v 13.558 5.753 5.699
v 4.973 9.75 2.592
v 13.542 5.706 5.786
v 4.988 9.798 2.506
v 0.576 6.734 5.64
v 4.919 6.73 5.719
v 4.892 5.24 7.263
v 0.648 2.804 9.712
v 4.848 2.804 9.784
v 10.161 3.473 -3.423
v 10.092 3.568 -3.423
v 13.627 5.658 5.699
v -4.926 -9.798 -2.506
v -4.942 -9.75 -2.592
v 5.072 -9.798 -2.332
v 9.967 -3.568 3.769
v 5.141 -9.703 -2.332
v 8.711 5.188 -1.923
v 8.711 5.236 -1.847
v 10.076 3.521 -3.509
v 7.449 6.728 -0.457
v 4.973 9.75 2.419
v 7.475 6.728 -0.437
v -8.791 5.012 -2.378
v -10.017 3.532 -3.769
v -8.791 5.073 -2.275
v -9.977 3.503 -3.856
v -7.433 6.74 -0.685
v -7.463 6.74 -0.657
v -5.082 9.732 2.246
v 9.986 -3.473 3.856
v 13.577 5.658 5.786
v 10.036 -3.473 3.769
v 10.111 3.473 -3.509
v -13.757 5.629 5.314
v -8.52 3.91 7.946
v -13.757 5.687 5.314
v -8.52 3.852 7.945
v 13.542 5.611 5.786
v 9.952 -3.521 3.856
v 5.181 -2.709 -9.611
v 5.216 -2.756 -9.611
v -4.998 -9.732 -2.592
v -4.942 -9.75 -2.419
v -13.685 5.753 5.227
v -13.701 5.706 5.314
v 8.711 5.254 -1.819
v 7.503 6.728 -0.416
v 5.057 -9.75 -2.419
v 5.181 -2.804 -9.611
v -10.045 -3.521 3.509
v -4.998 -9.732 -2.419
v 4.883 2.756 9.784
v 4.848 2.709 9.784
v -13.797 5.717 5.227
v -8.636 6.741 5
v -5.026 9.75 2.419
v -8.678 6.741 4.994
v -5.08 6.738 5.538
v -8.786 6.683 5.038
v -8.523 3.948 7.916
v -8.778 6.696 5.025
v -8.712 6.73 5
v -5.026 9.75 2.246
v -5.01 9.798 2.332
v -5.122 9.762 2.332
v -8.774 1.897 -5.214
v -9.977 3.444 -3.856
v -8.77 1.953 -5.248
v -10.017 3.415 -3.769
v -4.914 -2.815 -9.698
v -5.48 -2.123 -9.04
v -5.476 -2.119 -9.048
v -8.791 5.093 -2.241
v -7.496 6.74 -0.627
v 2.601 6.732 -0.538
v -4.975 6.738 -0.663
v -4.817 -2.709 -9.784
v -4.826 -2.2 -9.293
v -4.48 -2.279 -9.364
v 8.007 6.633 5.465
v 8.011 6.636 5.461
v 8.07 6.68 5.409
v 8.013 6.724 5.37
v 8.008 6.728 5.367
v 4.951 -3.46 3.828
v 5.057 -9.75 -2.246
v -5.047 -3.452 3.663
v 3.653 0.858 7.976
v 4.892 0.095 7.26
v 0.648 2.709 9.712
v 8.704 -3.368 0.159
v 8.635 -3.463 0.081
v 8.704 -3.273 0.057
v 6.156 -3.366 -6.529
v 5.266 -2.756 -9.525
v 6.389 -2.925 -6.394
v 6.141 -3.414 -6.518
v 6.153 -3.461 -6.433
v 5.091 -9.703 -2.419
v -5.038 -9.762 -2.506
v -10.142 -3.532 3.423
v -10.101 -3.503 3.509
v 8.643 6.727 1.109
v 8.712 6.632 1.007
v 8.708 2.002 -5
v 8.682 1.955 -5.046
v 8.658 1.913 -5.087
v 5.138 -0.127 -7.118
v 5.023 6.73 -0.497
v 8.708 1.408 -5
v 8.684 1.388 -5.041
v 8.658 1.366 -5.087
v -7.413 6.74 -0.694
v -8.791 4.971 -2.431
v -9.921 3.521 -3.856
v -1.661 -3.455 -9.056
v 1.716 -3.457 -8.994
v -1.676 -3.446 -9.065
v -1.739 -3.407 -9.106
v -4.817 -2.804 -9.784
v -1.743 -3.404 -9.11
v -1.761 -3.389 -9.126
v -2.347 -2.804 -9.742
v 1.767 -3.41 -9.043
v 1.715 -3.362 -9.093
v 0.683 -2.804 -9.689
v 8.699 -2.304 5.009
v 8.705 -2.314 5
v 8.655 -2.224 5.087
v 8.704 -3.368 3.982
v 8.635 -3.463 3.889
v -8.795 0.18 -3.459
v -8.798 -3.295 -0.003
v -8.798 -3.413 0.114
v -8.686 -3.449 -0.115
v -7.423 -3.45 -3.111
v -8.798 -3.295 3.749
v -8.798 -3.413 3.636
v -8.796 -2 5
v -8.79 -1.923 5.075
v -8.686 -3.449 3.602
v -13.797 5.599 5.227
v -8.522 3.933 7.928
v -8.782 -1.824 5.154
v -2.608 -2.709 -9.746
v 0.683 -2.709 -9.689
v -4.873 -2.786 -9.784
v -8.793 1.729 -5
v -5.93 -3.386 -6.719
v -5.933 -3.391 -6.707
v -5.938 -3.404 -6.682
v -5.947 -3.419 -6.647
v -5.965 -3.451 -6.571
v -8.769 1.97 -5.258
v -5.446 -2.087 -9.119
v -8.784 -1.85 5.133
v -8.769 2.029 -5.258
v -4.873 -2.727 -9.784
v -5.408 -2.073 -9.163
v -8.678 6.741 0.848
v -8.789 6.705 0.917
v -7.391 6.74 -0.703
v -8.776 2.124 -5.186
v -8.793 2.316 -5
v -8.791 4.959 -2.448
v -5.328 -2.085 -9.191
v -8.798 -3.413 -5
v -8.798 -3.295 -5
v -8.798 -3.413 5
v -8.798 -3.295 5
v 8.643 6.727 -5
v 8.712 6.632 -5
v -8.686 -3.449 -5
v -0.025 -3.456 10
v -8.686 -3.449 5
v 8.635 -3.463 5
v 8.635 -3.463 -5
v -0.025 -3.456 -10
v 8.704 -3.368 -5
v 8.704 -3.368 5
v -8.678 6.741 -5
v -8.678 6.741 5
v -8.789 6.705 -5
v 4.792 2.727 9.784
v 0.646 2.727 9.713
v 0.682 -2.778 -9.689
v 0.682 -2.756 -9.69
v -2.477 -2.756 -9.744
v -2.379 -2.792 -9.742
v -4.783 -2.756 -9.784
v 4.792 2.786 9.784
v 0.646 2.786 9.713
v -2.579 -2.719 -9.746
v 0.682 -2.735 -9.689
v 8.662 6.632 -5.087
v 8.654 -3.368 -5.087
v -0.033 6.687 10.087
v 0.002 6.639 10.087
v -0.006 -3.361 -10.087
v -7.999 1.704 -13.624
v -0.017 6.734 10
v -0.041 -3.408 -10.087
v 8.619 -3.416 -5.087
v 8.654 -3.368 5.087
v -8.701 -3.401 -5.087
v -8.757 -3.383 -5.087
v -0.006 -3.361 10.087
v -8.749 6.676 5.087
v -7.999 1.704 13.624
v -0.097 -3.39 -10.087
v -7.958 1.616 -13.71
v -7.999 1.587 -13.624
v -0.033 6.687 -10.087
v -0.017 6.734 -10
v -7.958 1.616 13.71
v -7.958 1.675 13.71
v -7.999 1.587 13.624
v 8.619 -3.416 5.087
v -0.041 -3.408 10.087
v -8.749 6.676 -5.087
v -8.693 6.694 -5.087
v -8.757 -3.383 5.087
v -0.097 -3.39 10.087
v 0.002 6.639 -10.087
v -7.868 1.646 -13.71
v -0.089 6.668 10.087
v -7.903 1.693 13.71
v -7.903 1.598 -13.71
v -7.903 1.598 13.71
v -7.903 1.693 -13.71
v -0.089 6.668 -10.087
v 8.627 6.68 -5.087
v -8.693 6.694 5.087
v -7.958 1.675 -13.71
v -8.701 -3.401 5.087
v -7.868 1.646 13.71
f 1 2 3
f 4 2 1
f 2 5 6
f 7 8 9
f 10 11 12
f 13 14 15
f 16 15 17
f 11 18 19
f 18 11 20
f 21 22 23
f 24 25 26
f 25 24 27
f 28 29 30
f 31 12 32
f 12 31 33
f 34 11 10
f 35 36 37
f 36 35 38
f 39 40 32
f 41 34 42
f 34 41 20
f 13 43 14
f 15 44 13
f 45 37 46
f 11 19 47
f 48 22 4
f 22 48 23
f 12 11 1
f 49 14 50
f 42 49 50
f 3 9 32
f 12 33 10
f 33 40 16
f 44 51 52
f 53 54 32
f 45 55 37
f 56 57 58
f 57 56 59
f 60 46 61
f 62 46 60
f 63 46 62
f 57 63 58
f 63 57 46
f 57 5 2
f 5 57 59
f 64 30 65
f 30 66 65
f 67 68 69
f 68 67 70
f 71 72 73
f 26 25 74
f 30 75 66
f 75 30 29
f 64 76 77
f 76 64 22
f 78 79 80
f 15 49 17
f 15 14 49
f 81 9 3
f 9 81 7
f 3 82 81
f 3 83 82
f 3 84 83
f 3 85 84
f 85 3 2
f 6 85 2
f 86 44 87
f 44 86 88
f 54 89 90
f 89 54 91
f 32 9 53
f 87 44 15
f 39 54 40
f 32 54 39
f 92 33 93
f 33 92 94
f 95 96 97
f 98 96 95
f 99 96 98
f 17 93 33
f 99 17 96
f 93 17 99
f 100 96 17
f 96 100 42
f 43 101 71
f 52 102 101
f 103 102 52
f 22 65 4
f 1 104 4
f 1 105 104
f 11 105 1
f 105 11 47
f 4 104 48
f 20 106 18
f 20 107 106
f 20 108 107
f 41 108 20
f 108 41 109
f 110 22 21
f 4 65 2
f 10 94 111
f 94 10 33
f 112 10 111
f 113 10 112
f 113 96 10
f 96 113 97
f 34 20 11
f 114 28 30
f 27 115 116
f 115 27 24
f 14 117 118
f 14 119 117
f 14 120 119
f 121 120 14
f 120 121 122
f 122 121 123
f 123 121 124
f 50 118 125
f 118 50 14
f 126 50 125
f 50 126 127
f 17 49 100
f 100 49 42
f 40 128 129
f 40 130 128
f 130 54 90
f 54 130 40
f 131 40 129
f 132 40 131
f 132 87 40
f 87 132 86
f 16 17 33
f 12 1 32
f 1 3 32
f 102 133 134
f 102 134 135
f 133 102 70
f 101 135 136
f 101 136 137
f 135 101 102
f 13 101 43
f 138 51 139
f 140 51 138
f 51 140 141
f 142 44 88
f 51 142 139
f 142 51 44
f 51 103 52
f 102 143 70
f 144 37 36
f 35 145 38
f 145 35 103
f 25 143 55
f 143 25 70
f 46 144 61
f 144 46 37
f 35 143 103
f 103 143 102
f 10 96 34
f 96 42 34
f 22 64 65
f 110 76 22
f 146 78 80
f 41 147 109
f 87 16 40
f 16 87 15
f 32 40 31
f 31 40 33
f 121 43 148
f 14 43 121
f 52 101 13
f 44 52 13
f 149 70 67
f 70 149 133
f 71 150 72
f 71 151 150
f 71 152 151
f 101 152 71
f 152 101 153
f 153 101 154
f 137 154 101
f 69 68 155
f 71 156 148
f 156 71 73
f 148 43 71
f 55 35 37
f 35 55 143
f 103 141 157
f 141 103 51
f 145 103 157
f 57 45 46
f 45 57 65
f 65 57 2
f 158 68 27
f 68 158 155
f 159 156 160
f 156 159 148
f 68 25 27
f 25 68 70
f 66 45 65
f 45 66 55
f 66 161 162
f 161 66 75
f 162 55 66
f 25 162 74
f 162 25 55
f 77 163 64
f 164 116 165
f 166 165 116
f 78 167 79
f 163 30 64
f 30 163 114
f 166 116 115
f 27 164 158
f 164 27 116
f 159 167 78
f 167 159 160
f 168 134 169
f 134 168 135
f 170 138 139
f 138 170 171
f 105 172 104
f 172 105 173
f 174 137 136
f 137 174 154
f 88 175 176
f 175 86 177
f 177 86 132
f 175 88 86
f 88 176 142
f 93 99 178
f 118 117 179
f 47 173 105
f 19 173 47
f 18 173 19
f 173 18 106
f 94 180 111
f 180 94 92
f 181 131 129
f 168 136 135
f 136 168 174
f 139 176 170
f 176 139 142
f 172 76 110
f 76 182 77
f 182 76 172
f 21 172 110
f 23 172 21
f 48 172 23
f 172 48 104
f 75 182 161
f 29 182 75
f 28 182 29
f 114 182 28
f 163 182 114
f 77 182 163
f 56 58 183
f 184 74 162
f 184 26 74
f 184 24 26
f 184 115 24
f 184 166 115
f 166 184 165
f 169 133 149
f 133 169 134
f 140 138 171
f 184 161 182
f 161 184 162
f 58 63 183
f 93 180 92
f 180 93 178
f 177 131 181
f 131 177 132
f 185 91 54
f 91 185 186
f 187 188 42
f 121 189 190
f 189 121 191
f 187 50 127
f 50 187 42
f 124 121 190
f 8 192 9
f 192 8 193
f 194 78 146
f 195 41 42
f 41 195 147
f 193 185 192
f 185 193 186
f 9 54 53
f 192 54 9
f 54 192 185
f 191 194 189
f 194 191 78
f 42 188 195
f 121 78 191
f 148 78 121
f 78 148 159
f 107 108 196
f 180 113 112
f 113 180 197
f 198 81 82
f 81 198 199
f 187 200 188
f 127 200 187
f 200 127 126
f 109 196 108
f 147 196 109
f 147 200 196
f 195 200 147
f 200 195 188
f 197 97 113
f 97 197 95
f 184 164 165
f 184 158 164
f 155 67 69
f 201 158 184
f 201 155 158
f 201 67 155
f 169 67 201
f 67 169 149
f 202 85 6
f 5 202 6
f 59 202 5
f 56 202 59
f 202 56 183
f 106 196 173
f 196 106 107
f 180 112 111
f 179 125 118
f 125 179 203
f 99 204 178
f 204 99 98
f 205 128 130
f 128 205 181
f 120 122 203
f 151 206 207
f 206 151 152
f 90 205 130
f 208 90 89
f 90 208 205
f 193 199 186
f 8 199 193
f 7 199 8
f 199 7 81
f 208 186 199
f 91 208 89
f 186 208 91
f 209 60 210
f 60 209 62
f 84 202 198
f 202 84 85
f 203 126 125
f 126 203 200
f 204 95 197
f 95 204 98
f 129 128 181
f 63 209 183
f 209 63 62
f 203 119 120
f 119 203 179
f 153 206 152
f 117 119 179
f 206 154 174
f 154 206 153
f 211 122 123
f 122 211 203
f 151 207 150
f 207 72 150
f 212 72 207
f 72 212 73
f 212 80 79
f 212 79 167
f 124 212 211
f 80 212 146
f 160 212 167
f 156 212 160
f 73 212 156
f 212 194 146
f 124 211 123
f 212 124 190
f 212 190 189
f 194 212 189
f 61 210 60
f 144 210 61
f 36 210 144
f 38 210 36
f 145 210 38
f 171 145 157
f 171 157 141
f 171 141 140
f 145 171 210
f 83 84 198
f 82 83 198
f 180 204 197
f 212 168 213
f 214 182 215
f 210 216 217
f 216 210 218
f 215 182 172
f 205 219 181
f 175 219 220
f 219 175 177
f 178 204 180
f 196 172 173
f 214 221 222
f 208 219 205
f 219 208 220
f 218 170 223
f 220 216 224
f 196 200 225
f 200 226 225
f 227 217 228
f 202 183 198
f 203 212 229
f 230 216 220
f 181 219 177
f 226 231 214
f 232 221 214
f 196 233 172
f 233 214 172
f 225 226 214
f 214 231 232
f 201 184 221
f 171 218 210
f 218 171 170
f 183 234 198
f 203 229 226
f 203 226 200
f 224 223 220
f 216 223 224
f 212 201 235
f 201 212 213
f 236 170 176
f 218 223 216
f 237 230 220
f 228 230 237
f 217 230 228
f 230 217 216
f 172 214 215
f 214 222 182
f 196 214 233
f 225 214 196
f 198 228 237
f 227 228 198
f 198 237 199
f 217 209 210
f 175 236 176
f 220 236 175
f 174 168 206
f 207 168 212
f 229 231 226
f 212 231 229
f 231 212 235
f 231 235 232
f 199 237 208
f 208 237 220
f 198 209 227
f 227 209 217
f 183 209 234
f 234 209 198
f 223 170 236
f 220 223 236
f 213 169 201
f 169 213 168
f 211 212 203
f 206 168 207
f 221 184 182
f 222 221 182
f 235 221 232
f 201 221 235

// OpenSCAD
// Auto-generated OpenSCAD file

    inner_points = 10*[[-0.0056399232151652795, -0.3360917085536317, -0.9999999999999865], [-0.004821322839871758, 0.663907956393025, -1.0000000000000135], [-0.005639923215391682, -0.3360917085535774, 1.0000000000000135], [-0.004821322840098161, 0.6639079563930792, 0.9999999999999865], [-0.8716650368349537, -0.3353827798330664, -0.5000000000000846], [0.8603851904045097, -0.33680063727416976, -0.4999999999998884], [-0.8708464364596602, 0.6646168851135902, -0.5000000000001116], [0.8612037907798034, 0.6631990276724868, -0.49999999999991546], [-0.8716650368350669, -0.3353827798330393, 0.49999999999991546], [0.8603851904043966, -0.33680063727414267, 0.5000000000001116], [-0.8708464364597732, 0.6646168851136173, 0.4999999999998884], [0.8612037907796903, 0.6631990276725139, 0.5000000000000846], [-0.7917964519713716, 0.1645520072181886, -1.3623724356958835], [-0.7917964519716802, 0.16455200721826255, 1.3623724356957054]];

    outer_points = 10*[[-1.0060843799292358, -0.34733073917718565, 0.3422799703240538], [-0.9936151164744732, 0.34733073917718565, -0.3769487470944146], [0.9936151164744732, -0.34733073917718565, 0.3769487470944146], [1.0060843799292358, 0.34733073917718565, -0.3422799703240538], [-0.5165877783212961, 0.27563320269095287, 0.9524512611485145], [-0.49573123333532093, -0.9702946810453241, -0.2505569321152264], [-0.5041185148665335, 0.9702946810453241, 0.233222543730046], [-0.4832619698805584, -0.27563320269095287, -0.969785649533695], [0.4832619698805584, 0.27563320269095287, 0.969785649533695], [0.5041185148665335, -0.9702946810453241, -0.233222543730046], [0.49573123333532093, 0.9702946810453241, 0.2505569321152264], [0.5165877783212961, -0.27563320269095287, -0.9524512611485145], [-1.3716391974518345, 0.5658059352223662, 0.5226991745472914], [1.35269627612334, 0.5658059352223662, 0.5699309603985218]];

    // Convex hull for inner set (I)
    module inner_hull() {
        hull() {
            for (p = inner_points) {
                translate(p) sphere(r=0.1);
            }
        }
    }

    // Convex hull for outer set (O) minus inner hull (O \ I)
    module outer_minus_inner() {
        difference() {
            hull() {
                for (p = outer_points) {
                    translate(p) sphere(r=0.1);
                }
            }
            inner_hull(); // Subtract inner hull
        }
    }

    // Convex hull for outer set (O) minus all translated inner hulls
    module outer_minus_AllTranslationInner() {
        difference() {
            hull() {
                for (p = outer_points) {
                    translate(p) sphere(r=0.1);
                }
            }
            hull() {
                translate([0,0,50]) inner_hull();
                translate([0,0,-50]) inner_hull();
            }; // Subtract translated inner hulls
        }
    }

    // Difference between outer_minus_inner and outer_minus_AllTranslationInner
    module outer_minus_inner_diff() {
        difference() {
            // Outer minus inner
            difference() {
                hull() {
                    for (p = outer_points) {
                        translate(p) sphere(r=0.1);
                    }
                }
                inner_hull();
            }

            // Subtract Outer minus AllTranslationInner
            difference() {
                hull() {
                    for (p = outer_points) {
                        translate(p) sphere(r=0.1);
                    }
                }
                hull() {
                    translate([0,0,50]) inner_hull();
                    translate([0,0,-50]) inner_hull();
                };
            }
        }
    }

    // Rendering all with colors applied
    color([1, 0, 0, 0.5]) inner_hull(); // Transparent red
    color([0, 1, 0, 1]) outer_minus_AllTranslationInner(); // Opaque green
    color([1, 1, 0, 1]) outer_minus_inner_diff(); // Opaque yellow
    
